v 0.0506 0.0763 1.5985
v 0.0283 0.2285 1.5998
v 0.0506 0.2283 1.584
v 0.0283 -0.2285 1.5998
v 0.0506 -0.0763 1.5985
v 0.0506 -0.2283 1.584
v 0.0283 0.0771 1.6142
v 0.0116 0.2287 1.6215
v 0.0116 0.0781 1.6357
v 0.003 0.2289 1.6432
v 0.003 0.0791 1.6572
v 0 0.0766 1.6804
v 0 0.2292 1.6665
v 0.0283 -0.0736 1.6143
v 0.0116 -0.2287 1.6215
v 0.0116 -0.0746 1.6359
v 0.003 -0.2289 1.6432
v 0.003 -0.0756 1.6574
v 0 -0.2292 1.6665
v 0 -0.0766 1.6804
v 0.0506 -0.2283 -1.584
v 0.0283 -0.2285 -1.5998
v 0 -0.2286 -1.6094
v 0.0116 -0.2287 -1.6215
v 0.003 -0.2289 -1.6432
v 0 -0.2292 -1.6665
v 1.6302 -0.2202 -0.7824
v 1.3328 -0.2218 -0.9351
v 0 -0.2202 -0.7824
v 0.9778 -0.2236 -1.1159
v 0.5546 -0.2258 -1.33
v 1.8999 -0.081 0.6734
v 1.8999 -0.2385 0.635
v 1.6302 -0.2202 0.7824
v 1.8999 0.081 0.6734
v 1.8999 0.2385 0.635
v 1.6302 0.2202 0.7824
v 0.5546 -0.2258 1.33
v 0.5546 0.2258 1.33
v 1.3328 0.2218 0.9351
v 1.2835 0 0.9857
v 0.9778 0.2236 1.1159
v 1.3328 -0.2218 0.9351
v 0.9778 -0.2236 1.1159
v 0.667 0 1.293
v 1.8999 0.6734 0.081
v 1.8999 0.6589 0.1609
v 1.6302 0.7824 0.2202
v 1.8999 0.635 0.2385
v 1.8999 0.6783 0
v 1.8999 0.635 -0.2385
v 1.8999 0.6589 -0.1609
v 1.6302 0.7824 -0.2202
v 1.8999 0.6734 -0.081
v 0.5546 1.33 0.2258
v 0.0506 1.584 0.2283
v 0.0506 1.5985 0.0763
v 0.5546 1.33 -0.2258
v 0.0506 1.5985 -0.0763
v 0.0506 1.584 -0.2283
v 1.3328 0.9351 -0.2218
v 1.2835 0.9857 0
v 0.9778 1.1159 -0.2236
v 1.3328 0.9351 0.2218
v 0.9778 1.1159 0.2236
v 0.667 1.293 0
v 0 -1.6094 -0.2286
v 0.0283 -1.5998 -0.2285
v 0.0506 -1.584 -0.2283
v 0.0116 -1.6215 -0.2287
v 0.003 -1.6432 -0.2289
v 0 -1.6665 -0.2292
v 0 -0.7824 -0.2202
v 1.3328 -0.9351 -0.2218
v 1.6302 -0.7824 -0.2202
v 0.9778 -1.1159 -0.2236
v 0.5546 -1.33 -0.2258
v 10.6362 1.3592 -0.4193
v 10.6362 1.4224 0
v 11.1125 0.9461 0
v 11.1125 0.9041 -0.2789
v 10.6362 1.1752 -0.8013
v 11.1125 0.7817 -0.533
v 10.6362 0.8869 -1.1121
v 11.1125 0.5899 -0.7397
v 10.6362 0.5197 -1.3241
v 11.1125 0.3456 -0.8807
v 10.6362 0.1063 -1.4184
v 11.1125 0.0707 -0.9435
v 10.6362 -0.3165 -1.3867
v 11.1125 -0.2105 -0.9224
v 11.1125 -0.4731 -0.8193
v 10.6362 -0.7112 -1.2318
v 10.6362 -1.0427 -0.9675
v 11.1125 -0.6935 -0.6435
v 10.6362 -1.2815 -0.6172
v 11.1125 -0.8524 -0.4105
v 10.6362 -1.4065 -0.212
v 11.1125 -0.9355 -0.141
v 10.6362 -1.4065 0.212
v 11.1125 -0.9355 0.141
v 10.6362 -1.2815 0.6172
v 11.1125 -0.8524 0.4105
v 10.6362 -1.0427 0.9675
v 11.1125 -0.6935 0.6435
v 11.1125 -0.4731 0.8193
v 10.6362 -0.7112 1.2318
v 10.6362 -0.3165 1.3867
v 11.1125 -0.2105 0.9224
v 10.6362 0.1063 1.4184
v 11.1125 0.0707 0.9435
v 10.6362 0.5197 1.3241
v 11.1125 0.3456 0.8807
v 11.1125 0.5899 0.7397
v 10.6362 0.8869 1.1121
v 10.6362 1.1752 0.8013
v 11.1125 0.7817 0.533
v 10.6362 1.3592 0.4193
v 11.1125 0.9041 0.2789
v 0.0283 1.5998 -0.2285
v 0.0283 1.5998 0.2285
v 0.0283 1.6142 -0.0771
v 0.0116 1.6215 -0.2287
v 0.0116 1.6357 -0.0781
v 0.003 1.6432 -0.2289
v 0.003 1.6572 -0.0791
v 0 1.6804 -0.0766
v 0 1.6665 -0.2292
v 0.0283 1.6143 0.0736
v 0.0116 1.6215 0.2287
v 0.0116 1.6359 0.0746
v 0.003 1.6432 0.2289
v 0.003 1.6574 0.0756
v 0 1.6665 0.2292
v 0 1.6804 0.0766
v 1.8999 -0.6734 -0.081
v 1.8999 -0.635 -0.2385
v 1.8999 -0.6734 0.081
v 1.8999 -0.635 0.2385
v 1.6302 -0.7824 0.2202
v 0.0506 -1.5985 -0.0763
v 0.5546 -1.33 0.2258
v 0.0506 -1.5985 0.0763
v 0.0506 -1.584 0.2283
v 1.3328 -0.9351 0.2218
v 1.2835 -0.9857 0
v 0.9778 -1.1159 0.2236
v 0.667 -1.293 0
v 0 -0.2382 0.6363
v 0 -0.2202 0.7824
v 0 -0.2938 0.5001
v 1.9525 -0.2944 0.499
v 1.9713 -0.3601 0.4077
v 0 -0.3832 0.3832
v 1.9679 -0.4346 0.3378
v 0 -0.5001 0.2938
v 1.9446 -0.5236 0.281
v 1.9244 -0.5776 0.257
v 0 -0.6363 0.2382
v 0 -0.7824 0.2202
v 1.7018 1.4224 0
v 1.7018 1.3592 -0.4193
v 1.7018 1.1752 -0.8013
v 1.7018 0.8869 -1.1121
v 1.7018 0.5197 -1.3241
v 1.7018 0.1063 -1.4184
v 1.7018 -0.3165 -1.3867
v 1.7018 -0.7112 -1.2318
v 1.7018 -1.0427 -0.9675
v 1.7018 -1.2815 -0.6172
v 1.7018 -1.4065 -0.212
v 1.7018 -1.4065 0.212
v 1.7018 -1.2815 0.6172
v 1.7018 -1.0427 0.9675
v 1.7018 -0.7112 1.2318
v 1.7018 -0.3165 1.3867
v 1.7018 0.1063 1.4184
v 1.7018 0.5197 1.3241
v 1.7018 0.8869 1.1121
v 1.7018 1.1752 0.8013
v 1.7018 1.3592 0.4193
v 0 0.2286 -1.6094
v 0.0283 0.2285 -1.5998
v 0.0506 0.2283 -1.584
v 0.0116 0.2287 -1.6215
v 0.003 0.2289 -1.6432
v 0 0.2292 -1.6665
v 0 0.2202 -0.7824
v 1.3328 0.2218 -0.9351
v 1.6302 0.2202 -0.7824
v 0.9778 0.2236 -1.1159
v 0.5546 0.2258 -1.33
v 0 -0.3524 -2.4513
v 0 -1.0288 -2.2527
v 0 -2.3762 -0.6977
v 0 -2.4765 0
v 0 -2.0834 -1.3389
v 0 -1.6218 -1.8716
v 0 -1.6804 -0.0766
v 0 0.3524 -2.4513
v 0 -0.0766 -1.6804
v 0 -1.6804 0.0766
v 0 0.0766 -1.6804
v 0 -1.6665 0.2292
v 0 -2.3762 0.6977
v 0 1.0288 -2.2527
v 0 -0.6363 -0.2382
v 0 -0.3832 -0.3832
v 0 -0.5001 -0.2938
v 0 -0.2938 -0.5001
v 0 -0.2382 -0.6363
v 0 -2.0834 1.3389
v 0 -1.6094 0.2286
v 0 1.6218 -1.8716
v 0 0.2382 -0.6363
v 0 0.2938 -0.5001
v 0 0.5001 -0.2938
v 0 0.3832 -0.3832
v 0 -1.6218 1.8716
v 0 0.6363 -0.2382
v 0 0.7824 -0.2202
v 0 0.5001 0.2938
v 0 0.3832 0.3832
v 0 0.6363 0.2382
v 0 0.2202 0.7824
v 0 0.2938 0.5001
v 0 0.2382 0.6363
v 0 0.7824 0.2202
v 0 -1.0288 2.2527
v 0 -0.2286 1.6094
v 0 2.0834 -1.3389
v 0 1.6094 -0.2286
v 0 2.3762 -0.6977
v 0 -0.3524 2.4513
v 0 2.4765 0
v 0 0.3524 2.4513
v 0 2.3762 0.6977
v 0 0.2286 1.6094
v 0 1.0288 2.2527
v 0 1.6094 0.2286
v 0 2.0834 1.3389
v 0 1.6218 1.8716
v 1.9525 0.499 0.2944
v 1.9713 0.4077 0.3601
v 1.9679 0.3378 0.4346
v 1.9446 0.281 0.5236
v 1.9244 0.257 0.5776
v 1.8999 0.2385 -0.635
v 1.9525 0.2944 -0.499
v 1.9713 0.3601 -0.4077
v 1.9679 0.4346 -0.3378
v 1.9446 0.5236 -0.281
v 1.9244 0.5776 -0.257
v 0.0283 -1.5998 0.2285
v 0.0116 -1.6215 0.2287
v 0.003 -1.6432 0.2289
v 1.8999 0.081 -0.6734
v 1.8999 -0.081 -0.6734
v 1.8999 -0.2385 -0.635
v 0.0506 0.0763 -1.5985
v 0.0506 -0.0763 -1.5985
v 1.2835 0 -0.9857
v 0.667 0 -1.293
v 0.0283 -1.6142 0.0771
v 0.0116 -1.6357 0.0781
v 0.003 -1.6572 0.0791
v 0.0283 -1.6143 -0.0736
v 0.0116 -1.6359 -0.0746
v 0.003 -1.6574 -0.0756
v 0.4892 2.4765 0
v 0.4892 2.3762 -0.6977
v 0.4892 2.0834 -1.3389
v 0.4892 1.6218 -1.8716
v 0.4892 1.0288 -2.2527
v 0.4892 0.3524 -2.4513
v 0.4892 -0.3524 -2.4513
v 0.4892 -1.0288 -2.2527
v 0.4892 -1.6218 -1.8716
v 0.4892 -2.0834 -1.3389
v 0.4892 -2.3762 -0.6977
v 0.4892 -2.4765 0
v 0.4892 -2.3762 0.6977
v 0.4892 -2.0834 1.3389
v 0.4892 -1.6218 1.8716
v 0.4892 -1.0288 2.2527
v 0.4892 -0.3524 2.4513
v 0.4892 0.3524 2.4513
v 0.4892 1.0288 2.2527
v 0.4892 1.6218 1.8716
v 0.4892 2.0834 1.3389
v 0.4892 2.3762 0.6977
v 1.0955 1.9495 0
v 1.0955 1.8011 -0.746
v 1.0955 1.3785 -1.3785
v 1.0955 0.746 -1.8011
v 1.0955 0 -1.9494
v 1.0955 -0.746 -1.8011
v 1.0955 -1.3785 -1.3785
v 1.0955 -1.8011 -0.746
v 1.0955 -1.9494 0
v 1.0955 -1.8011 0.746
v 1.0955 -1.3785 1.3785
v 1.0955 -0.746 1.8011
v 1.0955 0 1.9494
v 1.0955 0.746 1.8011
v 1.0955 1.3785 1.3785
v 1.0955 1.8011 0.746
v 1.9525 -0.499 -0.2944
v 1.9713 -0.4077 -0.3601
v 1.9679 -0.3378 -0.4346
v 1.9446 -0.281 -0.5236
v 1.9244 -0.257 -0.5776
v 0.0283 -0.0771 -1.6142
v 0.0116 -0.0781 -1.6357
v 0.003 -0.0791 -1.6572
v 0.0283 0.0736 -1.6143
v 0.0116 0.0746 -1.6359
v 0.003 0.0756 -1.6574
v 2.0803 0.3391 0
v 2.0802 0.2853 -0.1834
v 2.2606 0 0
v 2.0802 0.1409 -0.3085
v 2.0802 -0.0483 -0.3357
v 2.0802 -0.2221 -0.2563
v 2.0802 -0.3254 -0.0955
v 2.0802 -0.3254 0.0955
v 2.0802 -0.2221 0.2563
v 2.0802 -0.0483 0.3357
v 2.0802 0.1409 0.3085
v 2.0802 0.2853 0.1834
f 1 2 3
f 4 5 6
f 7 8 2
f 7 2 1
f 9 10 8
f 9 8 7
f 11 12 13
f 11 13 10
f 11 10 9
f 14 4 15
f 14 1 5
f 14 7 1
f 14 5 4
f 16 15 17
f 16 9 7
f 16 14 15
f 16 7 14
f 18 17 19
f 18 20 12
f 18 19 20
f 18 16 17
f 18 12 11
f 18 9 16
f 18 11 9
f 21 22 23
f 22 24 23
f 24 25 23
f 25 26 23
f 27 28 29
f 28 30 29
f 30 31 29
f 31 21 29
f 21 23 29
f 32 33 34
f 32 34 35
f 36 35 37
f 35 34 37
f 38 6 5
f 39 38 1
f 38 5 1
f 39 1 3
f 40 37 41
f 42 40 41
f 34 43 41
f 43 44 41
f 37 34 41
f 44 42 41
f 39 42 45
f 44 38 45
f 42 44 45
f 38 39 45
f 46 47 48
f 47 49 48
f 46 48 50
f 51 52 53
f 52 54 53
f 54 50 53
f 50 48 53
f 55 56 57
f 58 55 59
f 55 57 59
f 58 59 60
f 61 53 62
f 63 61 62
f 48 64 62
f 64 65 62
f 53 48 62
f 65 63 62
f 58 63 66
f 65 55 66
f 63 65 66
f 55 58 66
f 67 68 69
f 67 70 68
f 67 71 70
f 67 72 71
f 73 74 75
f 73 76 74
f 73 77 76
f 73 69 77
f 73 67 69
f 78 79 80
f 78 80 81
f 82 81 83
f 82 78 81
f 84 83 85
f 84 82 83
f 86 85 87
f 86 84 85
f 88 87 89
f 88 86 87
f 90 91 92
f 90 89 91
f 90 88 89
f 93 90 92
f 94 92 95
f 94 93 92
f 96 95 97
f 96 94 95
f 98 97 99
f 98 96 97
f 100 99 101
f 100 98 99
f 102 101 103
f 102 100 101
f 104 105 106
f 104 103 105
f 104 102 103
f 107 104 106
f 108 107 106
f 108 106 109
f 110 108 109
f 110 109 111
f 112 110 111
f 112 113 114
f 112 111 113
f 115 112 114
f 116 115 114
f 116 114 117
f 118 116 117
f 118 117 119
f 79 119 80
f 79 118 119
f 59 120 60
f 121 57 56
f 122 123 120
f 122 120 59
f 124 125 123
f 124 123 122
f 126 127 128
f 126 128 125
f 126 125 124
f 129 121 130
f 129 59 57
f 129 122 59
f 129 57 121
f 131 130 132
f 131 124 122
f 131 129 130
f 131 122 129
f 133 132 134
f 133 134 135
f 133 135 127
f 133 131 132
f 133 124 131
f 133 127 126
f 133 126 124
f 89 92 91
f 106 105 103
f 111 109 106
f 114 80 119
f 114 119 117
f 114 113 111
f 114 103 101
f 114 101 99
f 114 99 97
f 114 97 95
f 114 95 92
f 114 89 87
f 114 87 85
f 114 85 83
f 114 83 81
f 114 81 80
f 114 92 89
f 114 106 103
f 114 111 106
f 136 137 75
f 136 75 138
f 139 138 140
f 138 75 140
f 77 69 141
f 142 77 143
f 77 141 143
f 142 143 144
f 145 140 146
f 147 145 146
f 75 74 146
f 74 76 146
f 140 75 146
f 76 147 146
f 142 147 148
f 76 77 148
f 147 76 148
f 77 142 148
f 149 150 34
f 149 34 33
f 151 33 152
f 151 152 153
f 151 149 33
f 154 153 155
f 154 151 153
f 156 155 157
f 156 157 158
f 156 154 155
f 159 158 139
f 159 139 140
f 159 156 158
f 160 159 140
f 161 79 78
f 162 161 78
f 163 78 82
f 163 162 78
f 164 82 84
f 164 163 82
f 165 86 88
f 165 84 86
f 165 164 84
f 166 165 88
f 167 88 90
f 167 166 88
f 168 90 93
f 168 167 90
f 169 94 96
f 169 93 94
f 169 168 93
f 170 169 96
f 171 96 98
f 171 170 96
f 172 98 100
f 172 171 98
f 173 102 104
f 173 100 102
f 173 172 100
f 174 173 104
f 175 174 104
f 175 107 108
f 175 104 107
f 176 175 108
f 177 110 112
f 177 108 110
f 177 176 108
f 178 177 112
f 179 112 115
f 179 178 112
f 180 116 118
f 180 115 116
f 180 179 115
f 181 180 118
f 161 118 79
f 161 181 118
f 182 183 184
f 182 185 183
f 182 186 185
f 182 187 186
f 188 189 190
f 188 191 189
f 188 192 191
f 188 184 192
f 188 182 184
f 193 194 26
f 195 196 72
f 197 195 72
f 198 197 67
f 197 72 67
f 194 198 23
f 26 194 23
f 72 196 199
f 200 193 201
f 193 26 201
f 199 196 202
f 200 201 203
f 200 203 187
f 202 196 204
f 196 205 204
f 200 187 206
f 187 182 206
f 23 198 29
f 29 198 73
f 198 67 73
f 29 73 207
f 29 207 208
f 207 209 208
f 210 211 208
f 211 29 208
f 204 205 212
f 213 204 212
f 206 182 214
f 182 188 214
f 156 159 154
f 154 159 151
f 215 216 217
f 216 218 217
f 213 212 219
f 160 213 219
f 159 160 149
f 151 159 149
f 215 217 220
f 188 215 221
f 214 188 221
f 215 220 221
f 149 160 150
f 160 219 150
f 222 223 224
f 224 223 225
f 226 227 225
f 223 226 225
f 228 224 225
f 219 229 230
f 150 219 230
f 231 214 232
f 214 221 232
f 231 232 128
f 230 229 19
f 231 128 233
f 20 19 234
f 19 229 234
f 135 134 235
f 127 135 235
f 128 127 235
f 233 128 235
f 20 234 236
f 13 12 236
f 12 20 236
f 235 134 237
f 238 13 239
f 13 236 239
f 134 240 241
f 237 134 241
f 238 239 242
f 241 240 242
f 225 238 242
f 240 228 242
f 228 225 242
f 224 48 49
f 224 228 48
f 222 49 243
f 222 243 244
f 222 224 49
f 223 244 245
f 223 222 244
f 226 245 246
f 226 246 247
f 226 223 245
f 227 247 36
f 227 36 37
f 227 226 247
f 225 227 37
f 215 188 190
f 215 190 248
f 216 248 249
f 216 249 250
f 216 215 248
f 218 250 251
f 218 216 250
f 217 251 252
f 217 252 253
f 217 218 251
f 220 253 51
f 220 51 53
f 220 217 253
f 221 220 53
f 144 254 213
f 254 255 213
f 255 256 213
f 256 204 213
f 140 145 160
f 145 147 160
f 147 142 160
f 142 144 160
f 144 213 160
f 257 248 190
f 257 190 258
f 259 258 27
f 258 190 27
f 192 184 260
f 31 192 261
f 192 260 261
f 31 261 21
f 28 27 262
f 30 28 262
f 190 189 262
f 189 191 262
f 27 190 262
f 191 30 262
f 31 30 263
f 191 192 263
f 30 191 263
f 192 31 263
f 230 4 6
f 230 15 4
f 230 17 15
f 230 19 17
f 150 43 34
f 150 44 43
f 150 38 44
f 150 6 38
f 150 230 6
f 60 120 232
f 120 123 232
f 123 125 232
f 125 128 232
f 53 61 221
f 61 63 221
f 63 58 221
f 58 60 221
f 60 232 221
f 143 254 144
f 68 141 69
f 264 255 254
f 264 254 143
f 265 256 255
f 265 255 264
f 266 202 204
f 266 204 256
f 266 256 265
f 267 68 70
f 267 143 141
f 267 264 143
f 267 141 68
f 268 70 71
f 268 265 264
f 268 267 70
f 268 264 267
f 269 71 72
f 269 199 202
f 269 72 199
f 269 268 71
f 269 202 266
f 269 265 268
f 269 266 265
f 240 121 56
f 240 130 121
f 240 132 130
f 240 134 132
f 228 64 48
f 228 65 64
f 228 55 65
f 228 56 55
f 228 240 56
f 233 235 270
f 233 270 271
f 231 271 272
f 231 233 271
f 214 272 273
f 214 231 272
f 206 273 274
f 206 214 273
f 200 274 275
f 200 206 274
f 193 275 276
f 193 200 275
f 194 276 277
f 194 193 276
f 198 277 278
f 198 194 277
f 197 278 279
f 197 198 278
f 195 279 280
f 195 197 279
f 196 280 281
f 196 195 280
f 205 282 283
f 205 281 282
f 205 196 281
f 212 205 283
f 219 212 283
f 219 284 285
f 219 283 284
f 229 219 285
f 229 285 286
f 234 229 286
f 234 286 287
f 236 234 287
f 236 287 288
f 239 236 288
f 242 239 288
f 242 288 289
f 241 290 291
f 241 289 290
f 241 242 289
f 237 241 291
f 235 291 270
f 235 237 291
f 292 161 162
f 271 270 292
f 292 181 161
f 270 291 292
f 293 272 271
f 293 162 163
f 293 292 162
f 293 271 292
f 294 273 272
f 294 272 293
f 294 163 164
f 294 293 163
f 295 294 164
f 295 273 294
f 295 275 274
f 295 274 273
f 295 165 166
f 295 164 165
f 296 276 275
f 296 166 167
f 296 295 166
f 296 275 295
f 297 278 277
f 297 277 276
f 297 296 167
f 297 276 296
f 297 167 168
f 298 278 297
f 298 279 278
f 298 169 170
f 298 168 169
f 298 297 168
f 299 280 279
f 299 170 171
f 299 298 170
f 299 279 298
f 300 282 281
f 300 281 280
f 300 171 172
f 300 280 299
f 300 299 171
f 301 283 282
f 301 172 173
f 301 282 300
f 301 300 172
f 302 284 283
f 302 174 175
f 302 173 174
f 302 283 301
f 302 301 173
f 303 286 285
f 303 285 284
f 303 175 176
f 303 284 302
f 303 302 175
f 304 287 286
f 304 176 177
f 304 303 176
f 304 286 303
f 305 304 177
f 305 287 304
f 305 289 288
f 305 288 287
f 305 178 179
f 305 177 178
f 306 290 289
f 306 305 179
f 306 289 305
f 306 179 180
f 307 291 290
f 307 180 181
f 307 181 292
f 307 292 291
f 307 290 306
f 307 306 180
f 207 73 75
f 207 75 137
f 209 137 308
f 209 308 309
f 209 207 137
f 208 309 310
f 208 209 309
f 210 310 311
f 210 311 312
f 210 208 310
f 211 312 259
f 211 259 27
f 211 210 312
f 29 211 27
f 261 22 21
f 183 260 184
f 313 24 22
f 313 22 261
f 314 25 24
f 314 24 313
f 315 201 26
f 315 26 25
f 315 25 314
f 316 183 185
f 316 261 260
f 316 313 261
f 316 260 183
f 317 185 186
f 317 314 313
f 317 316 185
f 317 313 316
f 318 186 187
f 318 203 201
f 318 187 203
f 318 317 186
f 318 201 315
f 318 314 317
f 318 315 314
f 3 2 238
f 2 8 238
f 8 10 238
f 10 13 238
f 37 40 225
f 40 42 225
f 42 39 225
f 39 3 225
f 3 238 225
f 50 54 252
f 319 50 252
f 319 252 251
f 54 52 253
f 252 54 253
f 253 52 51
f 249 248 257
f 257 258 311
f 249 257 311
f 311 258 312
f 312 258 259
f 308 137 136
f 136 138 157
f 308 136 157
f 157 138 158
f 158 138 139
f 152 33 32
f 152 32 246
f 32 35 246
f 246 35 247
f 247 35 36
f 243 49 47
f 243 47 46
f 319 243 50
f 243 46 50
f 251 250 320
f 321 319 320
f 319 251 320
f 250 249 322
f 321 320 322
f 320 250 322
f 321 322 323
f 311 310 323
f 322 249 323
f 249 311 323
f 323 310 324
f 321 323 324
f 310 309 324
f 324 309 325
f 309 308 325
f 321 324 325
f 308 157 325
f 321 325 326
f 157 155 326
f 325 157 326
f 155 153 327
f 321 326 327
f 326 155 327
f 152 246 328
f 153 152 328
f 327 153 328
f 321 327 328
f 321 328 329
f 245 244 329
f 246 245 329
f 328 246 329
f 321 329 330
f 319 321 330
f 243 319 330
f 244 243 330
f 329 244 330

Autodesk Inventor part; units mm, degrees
ref_plane "YZ Plane" through (0, 0, 0) normal (1, 0, 0) x (0, 1, 0)
ref_plane "XZ Plane" through (0, 0, 0) normal (0, 1, 0) x (-1, 0, 0)
sketch "Sketch1" plane through (0, 0, 0) normal (0, 0, 1) x (1, 0, 0)
  line L0 (2.2606, 0) -> (11.1125, 0)
  line L1 (11.1125, 0) -> (11.1125, 1.4224)
  line L2 (11.1125, 1.4224) -> (1.7018, 1.4224)
  line L3 (0.4892, 2.4765) -> (0, 2.4765)
  line L4 (-2.2225, 0) -> (13.335, 0) projected
  line L5 (0, -0.4953) -> (0, 2.9718) projected
  line L6 (0, 1.6256) -> (1.8999, 0.6783)
  line L7 (1.8999, 0.6783) -> (2.2606, 0)
  line L8 (1.7018, 1.4224) -> (0.4892, 2.4765)
  line L9 (0, 2.4765) -> (0, 1.6256)
  dimension "d2" = 2.8448
  dimension "d3" = 4.953
  dimension "d4" = 2.2606
  dimension "d5" = 3.2512
  dimension "d6" = 26.5
  dimension "d7" = 62
  dimension "d13" = 41
  dimension "d14" = 1.7018
  dimension "d15" = 11.1125
revolve "Body" add sketch "Sketch1" angle 360 about axis through (2.2606, 0, 0) along (1, 0, 0) contours L7 L6 L5 L3 L8 L2 L1 L0
sketch "Sketch2" plane through (0, 0, 0) normal (-1, 0, 0) x (0, 0, 1)
  line L0 (0, -3.4671) -> (0, 3.4671) projected
  line L1 (-3.4671, 0) -> (3.4671, 0) projected
  line L2 (0, 1.6256) -> (0, 0) construction
  line L3 (0, 0) -> (1.6256, 0) construction
  arc A0 (0.5419, 0) -> (0, 0.5419) centre (0, 0) ccw
  line L4 (0, 0) -> (0.7947, 0.7947) construction
  arc A1 (0.8128, 0) -> (0, 0.8128) centre (0, 0) ccw construction
  line L5 (0.2286, 1.6094) -> (0.2202, 0.7824)
  line L6 (1.6094, 0.2286) -> (0.7824, 0.2202)
  arc A2 (0.2202, 0.7824) -> (0.7824, 0.2202) centre (0.7767, 0.7767) ccw
  arc A3 (1.6256, 0) -> (1.6094, 0.2286) centre (0, 0) ccw
  arc A4 (0.2286, 1.6094) -> (0, 1.6256) centre (0, 0) ccw
  arc A5 (1.6094, 0.2286) -> (0.2286, 1.6094) centre (0, 0) ccw
  line L7 (0.2286, -1.6094) -> (0.2202, -0.7824)
  line L8 (1.6094, -0.2286) -> (0.7824, -0.2202)
  arc A6 (0.7824, -0.2202) -> (0.2202, -0.7824) centre (0.7767, -0.7767) ccw
  arc A7 (1.6094, -0.2286) -> (1.6256, 0) centre (0, 0) ccw
  arc A8 (0, -1.6256) -> (0.2286, -1.6094) centre (0, 0) ccw
  arc A9 (0.2286, -1.6094) -> (1.6094, -0.2286) centre (0, 0) ccw
  line L9 (-0.2286, 1.6094) -> (-0.2202, 0.7824)
  line L10 (-1.6094, 0.2286) -> (-0.7824, 0.2202)
  arc A10 (-0.7824, 0.2202) -> (-0.2202, 0.7824) centre (-0.7767, 0.7767) ccw
  arc A11 (-1.6094, 0.2286) -> (-1.6256, 0) centre (0, 0) ccw
  arc A12 (0, 1.6256) -> (-0.2286, 1.6094) centre (0, 0) ccw
  arc A13 (-0.2286, 1.6094) -> (-1.6094, 0.2286) centre (0, 0) ccw
  arc A14 (-1.6094, -0.2286) -> (-0.2286, -1.6094) centre (0, 0) ccw
  arc A15 (-0.2286, -1.6094) -> (0, -1.6256) centre (0, 0) ccw
  arc A16 (-1.6256, 0) -> (-1.6094, -0.2286) centre (0, 0) ccw
  line L11 (-1.6094, -0.2286) -> (-0.7824, -0.2202)
  arc A17 (-0.2202, -0.7824) -> (-0.7824, -0.2202) centre (-0.7767, -0.7767) ccw
  line L12 (-0.2286, -1.6094) -> (-0.2202, -0.7824)
  dimension "d18" = 45
  dimension "d19" = 1.0837
  dimension "d20" = 1.6256
  dimension "d21" = 3.2512
  dimension "d22" = 0.2286
extrude "Slot" add sketch "Sketch2" against normal up to next contours A2 L5 A5 L6 | L9 A10 L10 A13 | L7 A6 L8 A9 | A14 L11 A17 L12
fillet "Fillet1" radius 0.0914 4 edges at (0, 1.6256, 0) (0, 0, 1.6256) (0, -1.6256, 0) (0, 0, -1.6256)
thread "Thread" size "4-40 UNC" class "2A" standard "ANSI Unified Screw Threads" length 7.8232
chamfer "Chamfer1" distance 0.4763 distance2 0.4763 1 edges at (11.1125, -1.4224, 0) measured on face at (11.1125, 0.2736, 0.8712)
ref_plane "Work Plane2" through (2.032, 0, 0) normal (0, 1, 0) x (1, 0, 0)
equation "\"d2\" = GD"
equation "\"d3\" = KOD"
equation "\"d4\" = INTI"
equation "\"d5\" = SDM"
equation "\"d13\" = 0.5 * SEWI"
equation "\"d14\" = KOH"
equation "\"d15\" = NLG"
equation "\"d19\" = 0.333333 * SDM"
equation "\"d20\" = 0.5 * SDM"
equation "\"d21\" = SDM"
equation "\"d22\" = 0.5 * SBR"
equation "\"d45\" = INTI"
equation "\"d25\" = 0.2 * SBR"
equation "\"d9\" = GEL"
equation "\"d11\" = -0.5 * SPD + 0.5 * GD"
equation "\"d12\" = GUL"
equation "\"GD\" = NND"
equation "\"NLG\" = 11.1125"
equation "\"GEL\" = 7.8232"
equation "\"KOD\" = 4.953"
equation "\"KOH\" = 1.7018"
equation "\"SDM\" = 3.2512"
equation "\"INTI\" = 2.2606"
equation "\"SBR\" = 0.4572"
equation "\"GUL\" = 0.75 * GAL"
equation "\"SPD\" = 1.8923"
equation "\"SEWI\" = 82deg"
equation "\"d0\" = NLG"
equation "\"d1\" = KOH"
equation "\"d17\" = SDM"
equation "\"TOA\" = 30deg"
equation "\"THREADDIA\" = 2.8448"
equation "\"BDM\" = NND"
equation "\"NND\" = 2.8448"
equation "\"GAL\" = 0.635"
equation "\"GD1\" = SPD"
properties part number "ANSI B18.6.3 - 4-40 x 7/16, CRFCHMSTII(5)" material "Steel, Mild"
